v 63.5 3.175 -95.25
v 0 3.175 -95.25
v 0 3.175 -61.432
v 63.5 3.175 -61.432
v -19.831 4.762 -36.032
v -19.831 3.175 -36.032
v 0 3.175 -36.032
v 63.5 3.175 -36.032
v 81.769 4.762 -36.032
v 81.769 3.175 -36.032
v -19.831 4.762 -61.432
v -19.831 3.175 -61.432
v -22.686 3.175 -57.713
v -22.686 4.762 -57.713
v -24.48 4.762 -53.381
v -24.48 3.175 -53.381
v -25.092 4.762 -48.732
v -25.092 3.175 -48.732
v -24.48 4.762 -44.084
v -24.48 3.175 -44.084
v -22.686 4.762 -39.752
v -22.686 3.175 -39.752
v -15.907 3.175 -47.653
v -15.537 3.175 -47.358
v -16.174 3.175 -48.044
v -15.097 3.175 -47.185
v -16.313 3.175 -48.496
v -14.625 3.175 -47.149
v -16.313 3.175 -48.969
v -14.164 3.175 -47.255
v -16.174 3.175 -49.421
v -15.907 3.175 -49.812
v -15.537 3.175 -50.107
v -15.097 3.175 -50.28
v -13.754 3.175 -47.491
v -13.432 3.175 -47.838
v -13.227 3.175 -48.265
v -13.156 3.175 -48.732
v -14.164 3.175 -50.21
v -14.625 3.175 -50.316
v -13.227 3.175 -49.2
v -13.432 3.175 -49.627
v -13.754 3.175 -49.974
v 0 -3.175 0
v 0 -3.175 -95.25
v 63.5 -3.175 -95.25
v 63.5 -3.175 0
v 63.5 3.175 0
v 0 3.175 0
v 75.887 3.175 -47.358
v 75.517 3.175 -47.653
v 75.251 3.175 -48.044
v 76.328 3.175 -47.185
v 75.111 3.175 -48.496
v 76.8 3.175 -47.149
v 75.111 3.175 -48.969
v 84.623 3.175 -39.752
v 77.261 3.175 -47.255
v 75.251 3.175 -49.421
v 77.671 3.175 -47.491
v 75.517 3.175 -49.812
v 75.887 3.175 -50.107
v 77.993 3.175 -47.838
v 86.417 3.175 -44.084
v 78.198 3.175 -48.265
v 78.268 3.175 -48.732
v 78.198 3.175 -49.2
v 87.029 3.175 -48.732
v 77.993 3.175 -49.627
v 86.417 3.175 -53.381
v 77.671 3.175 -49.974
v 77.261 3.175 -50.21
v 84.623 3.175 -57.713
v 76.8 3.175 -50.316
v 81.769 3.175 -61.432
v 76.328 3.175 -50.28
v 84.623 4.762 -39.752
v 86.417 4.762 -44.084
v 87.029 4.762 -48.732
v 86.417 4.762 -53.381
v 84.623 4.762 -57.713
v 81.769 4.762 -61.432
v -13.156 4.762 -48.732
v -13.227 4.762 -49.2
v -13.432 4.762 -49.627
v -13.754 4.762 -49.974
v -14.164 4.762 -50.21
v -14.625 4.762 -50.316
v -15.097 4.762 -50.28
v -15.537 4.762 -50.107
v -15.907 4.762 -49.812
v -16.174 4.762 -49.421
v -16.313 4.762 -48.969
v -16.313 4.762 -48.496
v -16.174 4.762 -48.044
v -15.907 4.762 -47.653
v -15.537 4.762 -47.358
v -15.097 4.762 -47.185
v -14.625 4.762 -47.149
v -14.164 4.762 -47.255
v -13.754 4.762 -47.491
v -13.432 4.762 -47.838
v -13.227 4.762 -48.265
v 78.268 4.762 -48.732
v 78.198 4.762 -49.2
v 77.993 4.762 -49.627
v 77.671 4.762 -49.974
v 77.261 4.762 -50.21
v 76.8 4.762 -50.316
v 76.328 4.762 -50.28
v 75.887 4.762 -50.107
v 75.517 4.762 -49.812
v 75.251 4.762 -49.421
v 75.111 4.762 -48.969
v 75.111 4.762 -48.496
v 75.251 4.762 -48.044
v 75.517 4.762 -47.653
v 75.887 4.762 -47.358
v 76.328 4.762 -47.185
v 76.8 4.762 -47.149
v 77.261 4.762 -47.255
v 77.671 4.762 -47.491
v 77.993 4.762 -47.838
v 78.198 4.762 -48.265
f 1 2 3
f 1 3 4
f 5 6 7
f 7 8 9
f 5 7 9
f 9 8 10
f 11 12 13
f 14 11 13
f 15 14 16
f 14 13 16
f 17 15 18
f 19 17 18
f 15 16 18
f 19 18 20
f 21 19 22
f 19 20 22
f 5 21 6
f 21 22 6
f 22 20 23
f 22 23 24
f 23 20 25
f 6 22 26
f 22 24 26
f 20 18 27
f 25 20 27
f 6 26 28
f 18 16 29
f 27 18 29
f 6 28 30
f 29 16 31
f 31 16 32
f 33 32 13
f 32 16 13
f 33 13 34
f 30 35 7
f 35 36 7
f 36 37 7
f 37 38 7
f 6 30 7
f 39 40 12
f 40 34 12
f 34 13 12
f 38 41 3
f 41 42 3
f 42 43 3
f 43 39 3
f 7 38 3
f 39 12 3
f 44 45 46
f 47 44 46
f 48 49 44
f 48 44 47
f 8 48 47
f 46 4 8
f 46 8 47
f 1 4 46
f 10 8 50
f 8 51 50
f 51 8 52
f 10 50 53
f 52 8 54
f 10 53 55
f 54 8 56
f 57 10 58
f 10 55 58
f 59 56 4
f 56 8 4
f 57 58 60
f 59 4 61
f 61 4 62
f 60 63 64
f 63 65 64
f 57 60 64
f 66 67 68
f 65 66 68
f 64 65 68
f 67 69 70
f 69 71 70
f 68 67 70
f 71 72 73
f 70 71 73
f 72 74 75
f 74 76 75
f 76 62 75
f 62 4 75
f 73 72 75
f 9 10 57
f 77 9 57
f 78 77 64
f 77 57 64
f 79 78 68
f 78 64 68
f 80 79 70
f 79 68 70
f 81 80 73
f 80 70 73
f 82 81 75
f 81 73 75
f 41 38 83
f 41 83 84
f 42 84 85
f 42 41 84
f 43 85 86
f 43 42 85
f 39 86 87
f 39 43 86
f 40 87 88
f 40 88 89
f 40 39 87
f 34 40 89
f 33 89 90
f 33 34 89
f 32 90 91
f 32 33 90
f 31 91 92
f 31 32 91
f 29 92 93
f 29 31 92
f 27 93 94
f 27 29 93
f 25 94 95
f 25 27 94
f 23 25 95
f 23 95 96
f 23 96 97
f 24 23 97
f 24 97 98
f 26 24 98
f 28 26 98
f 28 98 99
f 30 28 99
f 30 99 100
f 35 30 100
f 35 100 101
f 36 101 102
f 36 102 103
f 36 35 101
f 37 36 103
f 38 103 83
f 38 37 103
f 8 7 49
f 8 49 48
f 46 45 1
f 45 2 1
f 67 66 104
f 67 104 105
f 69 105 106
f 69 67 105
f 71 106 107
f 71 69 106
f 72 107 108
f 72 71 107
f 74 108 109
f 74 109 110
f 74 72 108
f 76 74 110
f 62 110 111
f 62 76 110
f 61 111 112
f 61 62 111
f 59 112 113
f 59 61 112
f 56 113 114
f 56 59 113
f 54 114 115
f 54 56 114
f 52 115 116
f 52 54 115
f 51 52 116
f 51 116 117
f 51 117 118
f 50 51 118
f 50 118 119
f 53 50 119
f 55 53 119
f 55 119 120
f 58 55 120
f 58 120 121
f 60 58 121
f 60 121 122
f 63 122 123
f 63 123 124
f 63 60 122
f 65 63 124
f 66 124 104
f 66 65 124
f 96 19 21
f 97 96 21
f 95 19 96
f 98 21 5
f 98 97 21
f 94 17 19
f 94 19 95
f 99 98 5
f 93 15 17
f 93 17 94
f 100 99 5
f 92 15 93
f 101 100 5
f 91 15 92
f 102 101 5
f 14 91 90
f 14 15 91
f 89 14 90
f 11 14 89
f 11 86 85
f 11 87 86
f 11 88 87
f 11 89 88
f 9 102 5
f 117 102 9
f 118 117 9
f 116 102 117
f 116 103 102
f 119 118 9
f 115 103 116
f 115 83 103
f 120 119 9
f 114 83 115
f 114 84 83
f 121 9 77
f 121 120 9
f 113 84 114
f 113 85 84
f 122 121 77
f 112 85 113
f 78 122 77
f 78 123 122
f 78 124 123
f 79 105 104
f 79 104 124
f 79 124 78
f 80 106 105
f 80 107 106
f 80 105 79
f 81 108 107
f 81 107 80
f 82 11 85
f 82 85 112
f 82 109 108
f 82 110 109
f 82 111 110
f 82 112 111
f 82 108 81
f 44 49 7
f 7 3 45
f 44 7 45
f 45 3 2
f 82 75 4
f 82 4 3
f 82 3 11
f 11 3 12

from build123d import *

# Parameters (mm, degrees)
SKETCH1_W           = 63.5
SKETCH1_H           = 95.25
BOSS_EXTRUDE1_DEPTH = 3.175
SKETCH2_R           = 1.5875
BOSS_EXTRUDE2_DEPTH = 1.5875


with BuildPart() as part:
    # Sketch1 → Boss-Extrude1 (new body, symmetric)
    with BuildSketch(Plane(origin=(0, 0, 0), x_dir=(1, 0, 0), z_dir=(0, 1, 0))):
        with Locations((31.75, 47.625)):
            Rectangle(SKETCH1_W, SKETCH1_H)
    extrude(amount=BOSS_EXTRUDE1_DEPTH, both=True)

    # Sketch2 → Boss-Extrude2 (add)
    with BuildSketch(Plane(origin=(0, 3.175, 0), x_dir=(1, 0, 0), z_dir=(0, 1, 0))):
        with BuildLine():
            Line((-19.831384914, 36.032499706), (81.768615086, 36.032499706))
            ThreePointArc((81.768615086, 36.032499706), (87.029127328, 48.732499706), (81.768615086, 61.432499706))
            Line((81.768615086, 61.432499706), (-19.831384914, 61.432499706))
            ThreePointArc((-19.831384914, 61.432499706), (-25.091897156, 48.732499706), (-19.831384914, 36.032499706))
        make_face()
        with Locations((-14.743661756, 48.732499706)):
            Circle(SKETCH2_R, mode=Mode.SUBTRACT)
        with Locations((76.680891929, 48.732499706)):
            Circle(SKETCH2_R, mode=Mode.SUBTRACT)
    extrude(amount=BOSS_EXTRUDE2_DEPTH)


solid = part.part
